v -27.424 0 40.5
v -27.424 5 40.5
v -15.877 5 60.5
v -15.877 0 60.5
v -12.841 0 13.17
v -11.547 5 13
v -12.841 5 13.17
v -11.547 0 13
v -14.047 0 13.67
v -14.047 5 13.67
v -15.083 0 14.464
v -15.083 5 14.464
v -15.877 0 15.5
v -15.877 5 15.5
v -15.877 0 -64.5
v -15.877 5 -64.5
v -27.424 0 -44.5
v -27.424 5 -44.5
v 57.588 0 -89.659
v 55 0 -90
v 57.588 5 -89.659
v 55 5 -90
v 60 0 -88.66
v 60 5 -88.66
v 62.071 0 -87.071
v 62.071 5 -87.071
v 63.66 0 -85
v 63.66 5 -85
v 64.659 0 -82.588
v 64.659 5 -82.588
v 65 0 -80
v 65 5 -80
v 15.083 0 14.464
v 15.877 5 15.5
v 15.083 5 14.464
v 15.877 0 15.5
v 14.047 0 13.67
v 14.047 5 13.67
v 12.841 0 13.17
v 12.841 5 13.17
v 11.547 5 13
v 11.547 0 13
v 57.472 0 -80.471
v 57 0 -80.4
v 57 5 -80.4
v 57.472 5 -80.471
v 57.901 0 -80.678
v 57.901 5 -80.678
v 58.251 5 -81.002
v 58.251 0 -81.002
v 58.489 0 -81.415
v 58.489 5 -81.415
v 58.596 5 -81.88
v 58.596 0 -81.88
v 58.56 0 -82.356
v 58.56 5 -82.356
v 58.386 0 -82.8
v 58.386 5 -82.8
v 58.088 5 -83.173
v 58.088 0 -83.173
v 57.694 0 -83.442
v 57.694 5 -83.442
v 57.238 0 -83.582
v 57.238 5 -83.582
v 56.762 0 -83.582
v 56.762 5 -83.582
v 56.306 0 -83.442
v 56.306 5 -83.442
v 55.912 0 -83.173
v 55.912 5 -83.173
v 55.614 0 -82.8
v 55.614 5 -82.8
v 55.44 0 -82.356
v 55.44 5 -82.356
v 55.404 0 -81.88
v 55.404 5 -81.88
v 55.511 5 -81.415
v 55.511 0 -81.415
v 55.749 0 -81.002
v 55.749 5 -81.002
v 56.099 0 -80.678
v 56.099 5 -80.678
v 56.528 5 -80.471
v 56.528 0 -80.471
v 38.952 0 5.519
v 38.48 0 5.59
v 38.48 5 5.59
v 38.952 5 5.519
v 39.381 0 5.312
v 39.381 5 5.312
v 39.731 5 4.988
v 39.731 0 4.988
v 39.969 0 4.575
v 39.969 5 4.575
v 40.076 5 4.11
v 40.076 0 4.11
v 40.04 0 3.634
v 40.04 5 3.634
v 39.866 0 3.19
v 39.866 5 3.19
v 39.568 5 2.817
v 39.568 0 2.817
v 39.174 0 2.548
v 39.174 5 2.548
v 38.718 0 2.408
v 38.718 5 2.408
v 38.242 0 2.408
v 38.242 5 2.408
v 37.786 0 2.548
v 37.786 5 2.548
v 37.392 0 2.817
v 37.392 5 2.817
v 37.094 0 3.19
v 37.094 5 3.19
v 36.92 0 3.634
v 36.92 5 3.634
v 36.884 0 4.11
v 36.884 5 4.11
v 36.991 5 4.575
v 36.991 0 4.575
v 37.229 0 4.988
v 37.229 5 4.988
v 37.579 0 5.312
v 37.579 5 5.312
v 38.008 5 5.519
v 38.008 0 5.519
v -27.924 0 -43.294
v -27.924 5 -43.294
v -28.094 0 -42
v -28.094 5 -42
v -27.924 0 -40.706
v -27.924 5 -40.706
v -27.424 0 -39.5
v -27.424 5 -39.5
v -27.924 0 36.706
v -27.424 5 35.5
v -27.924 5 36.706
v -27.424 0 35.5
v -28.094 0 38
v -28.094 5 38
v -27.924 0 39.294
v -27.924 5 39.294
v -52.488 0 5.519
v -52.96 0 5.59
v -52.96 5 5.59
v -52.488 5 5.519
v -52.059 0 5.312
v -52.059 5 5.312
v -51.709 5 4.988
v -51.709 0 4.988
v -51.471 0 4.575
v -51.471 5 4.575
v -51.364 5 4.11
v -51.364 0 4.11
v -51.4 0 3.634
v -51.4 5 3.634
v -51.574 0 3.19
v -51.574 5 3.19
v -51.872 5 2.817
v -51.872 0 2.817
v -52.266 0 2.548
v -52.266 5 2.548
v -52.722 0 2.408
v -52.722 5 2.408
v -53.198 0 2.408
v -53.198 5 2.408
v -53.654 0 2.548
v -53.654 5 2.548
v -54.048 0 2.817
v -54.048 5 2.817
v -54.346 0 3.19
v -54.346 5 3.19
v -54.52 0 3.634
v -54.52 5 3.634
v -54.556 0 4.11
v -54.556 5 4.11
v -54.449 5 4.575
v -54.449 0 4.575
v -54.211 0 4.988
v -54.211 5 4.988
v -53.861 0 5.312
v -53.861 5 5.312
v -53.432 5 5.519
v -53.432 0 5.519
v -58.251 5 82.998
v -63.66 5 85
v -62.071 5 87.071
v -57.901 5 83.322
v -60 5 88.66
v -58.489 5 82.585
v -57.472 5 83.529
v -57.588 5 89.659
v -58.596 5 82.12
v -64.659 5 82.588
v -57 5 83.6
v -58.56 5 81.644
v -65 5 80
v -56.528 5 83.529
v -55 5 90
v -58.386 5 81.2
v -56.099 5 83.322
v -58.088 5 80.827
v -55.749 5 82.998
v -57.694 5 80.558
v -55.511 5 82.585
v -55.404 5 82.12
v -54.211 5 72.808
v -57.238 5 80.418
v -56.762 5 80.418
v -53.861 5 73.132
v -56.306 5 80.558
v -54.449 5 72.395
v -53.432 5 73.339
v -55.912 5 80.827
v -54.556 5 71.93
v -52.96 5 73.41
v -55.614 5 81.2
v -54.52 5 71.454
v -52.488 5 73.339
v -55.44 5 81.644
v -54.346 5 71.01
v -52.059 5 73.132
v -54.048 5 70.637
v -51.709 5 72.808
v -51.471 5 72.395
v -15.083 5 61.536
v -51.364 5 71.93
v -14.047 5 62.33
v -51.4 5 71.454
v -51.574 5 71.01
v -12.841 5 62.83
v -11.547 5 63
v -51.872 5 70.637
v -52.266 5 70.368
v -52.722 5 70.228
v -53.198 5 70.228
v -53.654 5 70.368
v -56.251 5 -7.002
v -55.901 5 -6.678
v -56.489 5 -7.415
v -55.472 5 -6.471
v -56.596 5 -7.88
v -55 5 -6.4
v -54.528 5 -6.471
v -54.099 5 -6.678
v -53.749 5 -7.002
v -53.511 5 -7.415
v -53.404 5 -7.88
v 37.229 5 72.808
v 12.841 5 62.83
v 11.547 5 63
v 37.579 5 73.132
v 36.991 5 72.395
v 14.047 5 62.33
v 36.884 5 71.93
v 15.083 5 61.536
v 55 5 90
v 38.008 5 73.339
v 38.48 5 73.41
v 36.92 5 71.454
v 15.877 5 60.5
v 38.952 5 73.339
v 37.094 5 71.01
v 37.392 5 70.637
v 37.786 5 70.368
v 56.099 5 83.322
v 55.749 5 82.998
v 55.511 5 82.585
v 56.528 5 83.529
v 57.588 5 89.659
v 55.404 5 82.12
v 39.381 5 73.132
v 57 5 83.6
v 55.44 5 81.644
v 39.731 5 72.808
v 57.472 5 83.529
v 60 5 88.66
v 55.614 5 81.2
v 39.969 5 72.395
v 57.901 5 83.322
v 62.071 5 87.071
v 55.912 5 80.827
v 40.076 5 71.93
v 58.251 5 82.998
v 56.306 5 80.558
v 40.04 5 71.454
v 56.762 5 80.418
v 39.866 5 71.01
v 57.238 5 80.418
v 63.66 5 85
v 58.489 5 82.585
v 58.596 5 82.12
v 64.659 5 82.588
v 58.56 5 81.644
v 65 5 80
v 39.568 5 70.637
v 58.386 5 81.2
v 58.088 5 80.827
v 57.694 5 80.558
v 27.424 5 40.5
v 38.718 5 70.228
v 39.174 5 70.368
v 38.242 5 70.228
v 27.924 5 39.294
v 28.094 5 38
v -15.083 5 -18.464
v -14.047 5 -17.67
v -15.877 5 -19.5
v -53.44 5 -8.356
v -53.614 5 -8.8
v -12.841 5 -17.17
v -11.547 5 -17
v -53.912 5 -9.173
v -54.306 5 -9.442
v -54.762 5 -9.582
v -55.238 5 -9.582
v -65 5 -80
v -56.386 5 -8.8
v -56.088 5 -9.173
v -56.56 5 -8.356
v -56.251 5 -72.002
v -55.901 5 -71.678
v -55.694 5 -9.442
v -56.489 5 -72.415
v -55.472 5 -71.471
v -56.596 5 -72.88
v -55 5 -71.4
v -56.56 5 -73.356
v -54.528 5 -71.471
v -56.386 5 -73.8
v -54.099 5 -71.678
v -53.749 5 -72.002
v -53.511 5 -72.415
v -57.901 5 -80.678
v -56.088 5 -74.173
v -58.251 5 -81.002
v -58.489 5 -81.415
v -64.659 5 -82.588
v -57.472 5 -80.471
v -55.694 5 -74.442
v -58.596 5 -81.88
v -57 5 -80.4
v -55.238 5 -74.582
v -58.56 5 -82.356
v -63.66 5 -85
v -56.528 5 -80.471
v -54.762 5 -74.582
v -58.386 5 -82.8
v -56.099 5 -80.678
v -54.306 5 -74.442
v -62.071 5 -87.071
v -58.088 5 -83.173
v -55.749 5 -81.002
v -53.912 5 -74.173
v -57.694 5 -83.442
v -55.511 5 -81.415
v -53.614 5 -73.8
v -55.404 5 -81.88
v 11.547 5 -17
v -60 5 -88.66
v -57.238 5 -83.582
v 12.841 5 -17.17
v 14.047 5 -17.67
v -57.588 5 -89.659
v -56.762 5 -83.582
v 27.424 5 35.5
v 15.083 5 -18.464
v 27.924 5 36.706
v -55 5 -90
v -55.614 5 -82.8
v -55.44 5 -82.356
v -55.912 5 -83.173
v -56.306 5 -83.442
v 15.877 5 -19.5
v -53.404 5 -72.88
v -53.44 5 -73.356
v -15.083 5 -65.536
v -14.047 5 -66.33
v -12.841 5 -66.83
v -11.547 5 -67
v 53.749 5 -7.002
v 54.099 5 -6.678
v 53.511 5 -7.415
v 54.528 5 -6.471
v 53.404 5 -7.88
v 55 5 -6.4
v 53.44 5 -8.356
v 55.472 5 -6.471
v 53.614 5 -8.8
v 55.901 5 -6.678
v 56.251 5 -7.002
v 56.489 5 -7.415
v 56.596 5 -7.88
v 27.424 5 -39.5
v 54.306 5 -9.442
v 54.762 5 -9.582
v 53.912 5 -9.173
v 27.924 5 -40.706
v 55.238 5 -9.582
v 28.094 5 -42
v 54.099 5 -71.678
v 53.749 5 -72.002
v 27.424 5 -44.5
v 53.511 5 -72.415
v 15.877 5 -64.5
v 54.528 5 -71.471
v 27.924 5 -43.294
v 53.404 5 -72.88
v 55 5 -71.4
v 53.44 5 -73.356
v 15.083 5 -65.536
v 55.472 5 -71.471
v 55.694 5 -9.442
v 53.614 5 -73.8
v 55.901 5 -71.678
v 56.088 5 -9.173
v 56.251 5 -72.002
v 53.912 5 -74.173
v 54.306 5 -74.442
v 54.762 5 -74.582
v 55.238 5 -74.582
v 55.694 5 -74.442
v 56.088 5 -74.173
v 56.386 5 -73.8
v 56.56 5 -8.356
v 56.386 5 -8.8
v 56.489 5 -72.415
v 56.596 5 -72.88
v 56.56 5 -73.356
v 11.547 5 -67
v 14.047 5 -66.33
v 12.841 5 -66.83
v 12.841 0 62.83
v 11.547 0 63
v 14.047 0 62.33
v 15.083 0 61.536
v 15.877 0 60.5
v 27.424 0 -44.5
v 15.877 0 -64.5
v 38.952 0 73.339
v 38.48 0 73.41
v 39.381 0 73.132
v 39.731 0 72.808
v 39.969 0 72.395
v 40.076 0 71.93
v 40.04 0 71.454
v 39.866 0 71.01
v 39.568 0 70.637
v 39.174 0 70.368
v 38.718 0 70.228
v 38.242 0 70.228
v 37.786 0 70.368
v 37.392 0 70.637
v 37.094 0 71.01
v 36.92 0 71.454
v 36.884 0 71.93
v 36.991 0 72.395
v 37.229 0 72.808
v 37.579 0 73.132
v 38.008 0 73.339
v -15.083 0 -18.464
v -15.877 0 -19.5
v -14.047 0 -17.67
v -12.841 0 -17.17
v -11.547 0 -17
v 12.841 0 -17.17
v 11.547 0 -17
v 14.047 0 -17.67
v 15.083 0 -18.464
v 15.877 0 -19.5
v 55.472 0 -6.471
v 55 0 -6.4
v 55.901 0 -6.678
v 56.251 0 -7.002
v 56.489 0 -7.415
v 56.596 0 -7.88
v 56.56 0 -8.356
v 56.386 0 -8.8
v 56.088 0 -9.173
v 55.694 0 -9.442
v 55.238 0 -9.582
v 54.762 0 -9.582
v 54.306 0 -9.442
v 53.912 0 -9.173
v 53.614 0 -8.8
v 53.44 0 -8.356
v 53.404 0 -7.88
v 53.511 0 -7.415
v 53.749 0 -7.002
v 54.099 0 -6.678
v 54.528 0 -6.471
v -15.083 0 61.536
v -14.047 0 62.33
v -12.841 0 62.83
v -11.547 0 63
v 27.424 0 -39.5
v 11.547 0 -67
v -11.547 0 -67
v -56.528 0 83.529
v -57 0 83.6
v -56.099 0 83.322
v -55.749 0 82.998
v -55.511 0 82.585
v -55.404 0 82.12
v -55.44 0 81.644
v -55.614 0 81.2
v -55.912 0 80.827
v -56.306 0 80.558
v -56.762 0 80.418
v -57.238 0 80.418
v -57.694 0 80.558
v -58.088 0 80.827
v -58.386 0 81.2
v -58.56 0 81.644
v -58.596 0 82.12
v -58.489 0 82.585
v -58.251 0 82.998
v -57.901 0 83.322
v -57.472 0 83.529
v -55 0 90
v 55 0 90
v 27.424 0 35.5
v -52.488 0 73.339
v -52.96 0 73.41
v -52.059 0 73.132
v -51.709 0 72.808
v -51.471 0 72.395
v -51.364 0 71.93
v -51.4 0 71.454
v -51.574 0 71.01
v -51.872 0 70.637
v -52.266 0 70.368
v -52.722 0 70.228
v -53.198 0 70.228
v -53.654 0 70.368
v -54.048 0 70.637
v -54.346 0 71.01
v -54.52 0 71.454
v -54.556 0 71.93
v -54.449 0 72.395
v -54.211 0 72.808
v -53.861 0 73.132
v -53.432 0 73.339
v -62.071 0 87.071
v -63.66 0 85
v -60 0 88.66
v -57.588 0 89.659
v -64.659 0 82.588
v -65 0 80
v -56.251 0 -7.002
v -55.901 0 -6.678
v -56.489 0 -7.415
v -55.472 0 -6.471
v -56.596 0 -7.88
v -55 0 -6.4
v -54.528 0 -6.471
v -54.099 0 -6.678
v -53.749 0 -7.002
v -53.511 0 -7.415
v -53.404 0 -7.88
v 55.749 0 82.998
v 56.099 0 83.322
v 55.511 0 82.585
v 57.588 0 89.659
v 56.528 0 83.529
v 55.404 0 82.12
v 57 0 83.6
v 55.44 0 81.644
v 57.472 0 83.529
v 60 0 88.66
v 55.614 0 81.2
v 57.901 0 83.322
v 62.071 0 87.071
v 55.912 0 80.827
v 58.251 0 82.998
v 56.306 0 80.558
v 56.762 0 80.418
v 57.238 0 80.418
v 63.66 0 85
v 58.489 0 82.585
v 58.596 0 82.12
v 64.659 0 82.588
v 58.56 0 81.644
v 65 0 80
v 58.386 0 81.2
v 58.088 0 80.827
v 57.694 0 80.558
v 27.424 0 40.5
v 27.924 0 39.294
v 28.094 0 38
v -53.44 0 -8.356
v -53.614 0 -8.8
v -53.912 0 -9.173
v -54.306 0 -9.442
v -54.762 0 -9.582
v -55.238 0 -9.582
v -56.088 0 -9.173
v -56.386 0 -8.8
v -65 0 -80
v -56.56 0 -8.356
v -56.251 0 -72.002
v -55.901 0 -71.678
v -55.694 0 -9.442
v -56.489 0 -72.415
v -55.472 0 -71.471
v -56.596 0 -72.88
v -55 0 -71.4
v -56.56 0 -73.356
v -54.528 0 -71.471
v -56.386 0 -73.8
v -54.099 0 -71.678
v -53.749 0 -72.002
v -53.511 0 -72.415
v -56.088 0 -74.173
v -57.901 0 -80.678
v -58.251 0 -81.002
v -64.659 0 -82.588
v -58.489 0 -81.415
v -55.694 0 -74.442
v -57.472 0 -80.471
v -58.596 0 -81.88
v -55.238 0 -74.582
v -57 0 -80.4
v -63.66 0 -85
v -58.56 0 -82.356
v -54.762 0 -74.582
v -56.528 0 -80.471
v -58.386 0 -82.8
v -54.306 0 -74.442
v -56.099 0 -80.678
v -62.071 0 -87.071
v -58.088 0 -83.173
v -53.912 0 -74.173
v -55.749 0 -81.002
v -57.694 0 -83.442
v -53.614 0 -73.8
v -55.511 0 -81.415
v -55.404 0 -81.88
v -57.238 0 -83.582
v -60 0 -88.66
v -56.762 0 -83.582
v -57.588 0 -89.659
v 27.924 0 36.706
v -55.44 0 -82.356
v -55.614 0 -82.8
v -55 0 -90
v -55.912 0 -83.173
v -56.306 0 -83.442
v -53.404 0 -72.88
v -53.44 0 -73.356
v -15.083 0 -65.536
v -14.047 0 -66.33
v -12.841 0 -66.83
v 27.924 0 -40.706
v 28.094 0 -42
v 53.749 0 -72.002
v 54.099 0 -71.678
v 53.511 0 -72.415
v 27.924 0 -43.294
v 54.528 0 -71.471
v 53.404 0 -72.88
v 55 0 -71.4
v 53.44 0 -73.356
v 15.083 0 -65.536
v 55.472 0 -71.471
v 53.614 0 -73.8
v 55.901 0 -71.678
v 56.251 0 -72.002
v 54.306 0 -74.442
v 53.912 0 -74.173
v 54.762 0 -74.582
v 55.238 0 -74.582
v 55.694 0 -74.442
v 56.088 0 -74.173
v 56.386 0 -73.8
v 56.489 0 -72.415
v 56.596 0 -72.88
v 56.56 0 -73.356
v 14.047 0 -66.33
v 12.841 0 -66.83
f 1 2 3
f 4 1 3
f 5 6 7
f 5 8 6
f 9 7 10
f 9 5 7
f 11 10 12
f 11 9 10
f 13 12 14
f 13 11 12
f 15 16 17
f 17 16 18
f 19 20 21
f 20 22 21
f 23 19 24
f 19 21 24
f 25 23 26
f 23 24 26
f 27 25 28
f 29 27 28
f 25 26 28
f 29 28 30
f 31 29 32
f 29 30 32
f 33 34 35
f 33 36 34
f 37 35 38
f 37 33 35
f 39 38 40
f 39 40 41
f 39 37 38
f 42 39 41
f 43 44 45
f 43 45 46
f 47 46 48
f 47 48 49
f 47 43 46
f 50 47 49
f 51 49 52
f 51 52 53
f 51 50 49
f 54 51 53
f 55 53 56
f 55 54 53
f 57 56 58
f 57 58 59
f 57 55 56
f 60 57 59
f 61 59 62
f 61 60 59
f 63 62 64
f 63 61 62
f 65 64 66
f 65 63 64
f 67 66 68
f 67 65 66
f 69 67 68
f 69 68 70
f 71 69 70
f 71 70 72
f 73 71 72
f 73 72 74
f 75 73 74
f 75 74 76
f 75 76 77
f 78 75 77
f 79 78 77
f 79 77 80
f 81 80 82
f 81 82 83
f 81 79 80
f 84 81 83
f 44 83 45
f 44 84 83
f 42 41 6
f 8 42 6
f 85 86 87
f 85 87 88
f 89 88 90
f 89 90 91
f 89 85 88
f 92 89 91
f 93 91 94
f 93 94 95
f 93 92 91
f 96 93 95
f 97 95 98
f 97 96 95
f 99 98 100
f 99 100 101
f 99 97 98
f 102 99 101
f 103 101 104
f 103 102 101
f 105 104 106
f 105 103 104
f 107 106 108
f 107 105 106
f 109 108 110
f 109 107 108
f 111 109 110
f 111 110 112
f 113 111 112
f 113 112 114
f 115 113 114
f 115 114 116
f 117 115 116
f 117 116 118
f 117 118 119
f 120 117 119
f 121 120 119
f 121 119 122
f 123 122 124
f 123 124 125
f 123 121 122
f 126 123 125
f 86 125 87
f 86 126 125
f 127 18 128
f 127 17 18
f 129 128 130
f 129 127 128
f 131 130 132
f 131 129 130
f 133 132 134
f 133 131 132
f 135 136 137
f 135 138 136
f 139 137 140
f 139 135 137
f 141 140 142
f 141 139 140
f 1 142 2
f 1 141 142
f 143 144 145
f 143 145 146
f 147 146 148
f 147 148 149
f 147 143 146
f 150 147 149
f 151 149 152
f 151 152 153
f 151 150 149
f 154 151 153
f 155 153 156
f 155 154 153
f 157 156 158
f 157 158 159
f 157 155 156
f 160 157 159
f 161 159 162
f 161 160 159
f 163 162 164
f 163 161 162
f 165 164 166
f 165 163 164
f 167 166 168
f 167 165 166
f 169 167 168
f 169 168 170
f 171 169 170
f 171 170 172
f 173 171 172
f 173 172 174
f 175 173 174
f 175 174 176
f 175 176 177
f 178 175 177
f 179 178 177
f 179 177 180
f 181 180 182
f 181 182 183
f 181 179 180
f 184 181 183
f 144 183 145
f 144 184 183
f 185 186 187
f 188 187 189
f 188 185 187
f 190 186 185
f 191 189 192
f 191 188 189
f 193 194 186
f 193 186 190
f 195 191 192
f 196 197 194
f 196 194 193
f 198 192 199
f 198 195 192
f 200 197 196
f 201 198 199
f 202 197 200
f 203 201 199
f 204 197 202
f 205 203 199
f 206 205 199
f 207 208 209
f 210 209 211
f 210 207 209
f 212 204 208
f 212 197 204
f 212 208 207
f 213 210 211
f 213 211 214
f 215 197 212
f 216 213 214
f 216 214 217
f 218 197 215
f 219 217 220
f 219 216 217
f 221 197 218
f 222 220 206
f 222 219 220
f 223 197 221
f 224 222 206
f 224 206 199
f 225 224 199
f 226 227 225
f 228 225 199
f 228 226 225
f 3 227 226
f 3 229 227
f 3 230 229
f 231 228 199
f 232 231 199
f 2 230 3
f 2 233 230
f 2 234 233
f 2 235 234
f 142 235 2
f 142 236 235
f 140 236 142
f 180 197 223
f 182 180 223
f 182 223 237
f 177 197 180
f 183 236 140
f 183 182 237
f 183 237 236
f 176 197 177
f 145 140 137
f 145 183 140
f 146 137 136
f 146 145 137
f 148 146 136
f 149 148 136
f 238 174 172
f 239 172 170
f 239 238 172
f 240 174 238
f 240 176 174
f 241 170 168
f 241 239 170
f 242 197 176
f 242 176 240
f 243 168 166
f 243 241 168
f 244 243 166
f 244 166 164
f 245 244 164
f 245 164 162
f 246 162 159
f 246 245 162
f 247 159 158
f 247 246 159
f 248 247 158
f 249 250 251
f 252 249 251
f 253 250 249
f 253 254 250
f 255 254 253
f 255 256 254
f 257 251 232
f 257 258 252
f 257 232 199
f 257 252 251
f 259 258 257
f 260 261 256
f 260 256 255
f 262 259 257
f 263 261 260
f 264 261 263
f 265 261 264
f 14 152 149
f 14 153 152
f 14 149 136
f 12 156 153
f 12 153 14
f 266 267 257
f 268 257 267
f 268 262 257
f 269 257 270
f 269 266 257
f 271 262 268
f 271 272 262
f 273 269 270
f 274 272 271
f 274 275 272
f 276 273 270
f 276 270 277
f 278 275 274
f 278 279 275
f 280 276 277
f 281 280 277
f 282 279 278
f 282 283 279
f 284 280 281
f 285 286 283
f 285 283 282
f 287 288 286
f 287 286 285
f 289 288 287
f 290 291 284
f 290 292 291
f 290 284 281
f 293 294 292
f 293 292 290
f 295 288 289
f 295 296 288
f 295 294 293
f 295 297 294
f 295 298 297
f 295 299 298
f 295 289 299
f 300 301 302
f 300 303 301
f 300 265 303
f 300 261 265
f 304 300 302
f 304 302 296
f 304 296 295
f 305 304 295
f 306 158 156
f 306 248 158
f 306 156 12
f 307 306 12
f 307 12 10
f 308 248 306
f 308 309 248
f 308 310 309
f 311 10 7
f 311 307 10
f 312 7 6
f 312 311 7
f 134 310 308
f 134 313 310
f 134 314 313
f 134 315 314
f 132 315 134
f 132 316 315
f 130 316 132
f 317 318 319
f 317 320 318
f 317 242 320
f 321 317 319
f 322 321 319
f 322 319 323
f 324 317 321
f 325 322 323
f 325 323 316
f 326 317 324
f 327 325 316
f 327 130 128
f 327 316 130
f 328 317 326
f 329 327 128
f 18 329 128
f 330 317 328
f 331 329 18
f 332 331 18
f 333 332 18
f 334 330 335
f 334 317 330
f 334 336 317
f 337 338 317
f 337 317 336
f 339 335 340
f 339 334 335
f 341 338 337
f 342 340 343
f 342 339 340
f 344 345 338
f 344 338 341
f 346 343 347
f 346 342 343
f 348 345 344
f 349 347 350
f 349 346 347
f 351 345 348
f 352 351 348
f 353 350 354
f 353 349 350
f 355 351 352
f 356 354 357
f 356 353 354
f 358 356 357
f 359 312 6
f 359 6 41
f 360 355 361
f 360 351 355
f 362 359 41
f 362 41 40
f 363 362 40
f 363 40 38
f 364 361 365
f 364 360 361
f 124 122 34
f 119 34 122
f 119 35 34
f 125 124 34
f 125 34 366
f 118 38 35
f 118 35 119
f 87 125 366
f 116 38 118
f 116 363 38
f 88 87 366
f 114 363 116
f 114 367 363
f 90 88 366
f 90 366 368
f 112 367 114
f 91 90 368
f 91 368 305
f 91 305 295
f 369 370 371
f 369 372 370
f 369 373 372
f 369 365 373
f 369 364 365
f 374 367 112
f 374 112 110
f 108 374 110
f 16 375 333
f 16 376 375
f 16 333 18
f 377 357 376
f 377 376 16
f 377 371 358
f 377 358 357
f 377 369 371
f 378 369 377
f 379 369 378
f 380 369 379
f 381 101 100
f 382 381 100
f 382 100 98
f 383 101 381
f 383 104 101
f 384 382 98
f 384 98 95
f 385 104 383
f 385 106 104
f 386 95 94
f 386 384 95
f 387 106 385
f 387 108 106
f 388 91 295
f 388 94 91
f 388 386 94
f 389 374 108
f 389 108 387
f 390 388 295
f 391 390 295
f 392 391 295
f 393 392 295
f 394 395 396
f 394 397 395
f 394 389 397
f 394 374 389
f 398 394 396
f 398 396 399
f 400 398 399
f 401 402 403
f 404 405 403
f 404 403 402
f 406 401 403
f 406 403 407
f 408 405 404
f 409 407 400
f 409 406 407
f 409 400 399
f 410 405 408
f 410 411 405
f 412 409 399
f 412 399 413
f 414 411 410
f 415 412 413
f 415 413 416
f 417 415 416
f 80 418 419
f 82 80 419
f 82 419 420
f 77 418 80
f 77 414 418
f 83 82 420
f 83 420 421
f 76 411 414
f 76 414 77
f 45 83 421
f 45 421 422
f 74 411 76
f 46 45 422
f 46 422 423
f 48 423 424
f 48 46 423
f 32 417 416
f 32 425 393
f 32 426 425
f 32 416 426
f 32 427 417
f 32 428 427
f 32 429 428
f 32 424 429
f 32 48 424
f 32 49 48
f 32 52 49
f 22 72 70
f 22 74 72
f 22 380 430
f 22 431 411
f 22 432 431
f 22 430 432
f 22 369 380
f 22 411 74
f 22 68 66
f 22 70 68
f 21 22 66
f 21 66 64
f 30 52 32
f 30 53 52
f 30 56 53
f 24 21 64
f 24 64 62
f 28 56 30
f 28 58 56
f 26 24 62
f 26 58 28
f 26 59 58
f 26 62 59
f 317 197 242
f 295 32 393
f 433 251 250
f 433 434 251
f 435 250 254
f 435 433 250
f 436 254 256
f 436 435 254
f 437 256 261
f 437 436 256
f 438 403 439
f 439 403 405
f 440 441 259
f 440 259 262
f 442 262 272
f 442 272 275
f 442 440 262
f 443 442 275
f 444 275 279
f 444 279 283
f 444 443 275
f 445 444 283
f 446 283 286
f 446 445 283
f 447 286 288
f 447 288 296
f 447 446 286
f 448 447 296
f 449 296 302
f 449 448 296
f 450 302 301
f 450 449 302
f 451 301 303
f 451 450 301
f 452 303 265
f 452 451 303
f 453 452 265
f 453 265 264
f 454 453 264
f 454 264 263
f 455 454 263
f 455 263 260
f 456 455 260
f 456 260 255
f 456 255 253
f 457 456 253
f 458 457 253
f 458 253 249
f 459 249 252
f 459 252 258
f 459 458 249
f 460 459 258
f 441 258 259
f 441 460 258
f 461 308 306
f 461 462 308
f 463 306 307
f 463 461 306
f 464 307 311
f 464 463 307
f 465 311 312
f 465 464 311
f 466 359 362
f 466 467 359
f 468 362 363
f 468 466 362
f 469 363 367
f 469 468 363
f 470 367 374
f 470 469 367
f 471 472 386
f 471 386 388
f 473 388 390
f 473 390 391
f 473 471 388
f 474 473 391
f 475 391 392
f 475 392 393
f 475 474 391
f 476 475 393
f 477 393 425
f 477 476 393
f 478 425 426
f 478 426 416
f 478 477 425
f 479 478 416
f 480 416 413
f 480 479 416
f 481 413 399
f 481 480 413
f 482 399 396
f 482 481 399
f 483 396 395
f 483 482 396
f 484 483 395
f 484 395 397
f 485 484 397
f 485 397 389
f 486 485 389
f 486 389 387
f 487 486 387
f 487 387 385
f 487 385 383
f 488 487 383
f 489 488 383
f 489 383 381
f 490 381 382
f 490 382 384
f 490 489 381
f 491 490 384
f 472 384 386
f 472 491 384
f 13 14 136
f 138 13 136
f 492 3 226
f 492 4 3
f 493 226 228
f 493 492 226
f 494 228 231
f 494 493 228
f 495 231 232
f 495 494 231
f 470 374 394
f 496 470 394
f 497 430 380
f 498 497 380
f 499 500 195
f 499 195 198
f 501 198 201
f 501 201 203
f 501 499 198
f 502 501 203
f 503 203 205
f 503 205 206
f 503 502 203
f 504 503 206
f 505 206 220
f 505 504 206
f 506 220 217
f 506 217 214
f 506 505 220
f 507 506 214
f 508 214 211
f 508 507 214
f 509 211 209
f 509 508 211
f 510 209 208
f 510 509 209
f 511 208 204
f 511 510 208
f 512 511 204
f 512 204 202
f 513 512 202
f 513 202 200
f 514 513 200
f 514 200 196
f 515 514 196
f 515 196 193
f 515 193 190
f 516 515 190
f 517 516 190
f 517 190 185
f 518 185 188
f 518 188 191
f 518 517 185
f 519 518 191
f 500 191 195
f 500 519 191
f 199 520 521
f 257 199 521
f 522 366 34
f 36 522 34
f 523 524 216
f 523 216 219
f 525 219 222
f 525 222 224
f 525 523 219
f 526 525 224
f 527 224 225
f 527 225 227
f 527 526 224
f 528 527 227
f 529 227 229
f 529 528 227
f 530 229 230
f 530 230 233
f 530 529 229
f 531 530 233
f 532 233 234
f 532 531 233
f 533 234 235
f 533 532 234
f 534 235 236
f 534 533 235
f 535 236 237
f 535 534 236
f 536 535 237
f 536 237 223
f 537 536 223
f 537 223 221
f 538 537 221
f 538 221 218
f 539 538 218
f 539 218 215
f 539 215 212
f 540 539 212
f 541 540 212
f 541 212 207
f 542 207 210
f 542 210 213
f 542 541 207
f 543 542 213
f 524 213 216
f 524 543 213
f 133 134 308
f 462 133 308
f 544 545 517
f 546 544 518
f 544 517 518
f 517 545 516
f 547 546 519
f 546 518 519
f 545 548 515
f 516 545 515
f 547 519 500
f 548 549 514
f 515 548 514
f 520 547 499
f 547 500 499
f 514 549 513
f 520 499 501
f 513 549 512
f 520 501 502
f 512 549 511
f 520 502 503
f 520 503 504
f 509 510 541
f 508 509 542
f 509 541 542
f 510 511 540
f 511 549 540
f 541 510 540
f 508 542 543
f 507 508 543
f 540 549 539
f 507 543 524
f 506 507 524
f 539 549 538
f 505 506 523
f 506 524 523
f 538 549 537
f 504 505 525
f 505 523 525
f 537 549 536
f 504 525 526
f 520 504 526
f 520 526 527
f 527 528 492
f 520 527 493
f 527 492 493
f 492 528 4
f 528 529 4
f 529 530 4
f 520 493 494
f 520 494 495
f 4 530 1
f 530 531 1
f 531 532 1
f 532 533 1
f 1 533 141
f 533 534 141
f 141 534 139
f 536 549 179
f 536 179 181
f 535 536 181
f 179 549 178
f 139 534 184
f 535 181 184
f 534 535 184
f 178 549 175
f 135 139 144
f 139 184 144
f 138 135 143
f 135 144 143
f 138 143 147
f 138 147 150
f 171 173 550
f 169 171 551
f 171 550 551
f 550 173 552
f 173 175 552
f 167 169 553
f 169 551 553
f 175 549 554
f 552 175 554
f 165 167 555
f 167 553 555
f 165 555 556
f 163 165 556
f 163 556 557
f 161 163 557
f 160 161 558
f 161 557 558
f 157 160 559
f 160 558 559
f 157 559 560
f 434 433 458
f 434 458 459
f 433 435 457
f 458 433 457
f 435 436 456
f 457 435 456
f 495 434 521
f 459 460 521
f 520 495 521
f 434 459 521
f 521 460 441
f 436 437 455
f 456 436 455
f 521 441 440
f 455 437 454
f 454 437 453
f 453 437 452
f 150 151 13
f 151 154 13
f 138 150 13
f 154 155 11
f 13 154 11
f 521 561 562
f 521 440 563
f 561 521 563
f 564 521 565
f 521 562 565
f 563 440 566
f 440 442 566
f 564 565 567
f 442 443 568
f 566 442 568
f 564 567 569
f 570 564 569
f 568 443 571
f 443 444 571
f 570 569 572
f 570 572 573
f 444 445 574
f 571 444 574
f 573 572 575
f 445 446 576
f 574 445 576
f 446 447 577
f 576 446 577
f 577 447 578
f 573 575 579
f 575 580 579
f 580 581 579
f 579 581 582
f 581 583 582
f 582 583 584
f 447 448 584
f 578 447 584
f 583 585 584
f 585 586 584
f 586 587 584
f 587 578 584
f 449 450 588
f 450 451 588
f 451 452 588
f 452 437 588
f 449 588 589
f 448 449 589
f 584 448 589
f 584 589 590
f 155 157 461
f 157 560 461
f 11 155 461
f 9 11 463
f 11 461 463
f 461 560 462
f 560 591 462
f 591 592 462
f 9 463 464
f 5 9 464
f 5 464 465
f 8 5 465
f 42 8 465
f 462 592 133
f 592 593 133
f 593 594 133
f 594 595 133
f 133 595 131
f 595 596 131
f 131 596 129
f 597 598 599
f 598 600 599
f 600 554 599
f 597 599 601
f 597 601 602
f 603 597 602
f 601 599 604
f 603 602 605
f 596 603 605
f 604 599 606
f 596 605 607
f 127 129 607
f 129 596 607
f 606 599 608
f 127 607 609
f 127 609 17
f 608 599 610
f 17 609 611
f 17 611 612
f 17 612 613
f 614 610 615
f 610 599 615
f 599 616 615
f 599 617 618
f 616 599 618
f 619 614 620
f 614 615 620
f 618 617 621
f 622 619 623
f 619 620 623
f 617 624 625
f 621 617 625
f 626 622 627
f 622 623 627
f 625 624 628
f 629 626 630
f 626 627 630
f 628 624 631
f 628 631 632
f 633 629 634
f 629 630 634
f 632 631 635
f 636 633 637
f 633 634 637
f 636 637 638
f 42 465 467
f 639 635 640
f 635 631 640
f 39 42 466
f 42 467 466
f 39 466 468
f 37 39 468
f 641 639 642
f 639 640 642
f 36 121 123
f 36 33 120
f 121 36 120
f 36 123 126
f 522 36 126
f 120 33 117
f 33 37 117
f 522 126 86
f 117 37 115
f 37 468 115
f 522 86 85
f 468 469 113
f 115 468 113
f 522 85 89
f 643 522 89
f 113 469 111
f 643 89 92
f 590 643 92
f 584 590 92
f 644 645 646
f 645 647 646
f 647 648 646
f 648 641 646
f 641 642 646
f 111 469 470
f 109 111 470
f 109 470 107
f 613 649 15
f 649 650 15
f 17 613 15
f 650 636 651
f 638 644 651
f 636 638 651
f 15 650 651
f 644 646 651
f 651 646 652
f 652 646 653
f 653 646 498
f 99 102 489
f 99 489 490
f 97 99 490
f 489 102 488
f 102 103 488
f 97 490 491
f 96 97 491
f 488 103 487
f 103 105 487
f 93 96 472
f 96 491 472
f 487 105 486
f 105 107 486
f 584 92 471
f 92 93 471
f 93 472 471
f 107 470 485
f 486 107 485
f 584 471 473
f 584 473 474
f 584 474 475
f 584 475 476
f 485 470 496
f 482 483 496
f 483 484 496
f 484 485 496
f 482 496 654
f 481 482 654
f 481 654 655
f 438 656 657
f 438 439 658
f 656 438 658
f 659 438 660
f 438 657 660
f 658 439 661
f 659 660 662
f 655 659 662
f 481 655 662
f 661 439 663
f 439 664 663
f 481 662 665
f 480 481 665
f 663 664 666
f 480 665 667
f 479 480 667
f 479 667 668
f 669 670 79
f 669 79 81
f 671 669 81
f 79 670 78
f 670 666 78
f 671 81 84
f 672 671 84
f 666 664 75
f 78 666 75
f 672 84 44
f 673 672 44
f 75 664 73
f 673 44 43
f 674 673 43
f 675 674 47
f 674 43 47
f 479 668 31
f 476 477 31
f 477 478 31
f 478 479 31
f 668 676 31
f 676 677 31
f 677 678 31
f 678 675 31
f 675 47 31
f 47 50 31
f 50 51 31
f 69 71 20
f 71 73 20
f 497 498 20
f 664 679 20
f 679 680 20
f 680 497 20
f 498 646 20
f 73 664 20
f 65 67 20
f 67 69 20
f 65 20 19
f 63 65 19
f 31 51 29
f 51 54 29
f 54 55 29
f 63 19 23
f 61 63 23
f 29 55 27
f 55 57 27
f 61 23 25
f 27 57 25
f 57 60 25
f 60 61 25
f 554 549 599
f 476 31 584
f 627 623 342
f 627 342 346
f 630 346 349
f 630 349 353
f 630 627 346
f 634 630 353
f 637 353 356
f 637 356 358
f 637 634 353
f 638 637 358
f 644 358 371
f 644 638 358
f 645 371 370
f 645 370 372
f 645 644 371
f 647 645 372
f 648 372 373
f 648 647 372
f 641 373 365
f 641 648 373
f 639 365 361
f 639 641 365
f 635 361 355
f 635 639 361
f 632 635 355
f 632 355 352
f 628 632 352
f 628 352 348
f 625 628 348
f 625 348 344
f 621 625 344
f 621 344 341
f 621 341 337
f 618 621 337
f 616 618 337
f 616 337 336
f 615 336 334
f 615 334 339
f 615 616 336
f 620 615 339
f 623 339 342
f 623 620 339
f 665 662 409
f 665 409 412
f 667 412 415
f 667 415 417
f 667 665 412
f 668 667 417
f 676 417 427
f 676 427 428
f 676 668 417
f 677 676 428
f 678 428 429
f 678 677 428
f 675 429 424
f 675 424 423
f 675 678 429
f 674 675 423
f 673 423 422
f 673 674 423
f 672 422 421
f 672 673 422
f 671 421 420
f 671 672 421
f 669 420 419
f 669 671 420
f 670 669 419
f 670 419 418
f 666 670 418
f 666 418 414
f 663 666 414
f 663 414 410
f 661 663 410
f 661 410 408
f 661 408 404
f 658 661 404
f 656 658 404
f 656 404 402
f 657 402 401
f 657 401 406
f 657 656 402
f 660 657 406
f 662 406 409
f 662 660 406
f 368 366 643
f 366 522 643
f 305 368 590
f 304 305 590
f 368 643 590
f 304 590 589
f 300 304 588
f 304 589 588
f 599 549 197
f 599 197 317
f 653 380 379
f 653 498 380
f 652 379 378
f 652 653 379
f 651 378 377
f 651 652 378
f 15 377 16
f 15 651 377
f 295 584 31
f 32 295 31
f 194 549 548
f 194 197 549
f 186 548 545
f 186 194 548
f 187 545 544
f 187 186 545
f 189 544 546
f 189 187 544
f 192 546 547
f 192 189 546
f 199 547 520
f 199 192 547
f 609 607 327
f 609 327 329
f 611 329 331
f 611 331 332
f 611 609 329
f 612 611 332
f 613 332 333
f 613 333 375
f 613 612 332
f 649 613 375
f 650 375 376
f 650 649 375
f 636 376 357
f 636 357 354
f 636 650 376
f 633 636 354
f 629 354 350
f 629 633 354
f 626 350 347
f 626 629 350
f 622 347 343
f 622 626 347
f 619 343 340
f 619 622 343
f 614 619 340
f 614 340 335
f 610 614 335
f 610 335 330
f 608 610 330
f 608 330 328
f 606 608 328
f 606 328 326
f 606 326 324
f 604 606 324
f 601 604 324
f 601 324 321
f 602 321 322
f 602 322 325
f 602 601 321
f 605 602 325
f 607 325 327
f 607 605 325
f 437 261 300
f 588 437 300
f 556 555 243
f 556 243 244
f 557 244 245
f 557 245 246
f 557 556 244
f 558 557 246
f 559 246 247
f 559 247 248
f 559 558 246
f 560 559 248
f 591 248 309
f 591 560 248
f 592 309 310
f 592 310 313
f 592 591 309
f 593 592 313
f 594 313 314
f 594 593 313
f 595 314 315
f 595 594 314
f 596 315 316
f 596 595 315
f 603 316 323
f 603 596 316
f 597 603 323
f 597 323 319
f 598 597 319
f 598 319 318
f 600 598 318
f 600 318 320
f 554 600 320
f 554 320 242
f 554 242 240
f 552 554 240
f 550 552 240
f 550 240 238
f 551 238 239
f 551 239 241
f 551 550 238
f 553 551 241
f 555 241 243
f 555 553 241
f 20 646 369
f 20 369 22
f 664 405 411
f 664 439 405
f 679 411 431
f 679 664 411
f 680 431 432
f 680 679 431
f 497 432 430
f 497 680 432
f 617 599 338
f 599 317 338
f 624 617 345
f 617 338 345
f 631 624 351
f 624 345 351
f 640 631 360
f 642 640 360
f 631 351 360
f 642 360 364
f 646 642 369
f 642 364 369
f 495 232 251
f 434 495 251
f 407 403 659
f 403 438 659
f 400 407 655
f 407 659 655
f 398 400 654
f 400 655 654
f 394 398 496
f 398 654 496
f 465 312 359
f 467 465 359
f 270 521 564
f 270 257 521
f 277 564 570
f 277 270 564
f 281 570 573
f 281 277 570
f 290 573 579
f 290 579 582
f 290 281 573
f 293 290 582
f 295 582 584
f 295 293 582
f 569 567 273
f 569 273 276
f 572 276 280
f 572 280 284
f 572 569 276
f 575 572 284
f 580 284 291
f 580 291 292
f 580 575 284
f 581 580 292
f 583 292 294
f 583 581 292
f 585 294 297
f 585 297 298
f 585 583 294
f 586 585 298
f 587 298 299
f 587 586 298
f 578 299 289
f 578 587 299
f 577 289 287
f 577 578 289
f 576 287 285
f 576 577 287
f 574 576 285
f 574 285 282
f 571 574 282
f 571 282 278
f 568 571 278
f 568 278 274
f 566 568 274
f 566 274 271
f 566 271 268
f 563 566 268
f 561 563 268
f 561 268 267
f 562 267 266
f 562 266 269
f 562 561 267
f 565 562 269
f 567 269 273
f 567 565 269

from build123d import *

# Parameters (mm, degrees)
SKETCH1_W           = 130
SKETCH1_H           = 180
SKETCH1_R           = 1.6
SKETCH1_W_2         = 116.84
SKETCH1_H_2         = 76.2
SKETCH1_W_3         = 120
SKETCH1_H_3         = 75
BOSS_EXTRUDE1_DEPTH = 5
FILLET1_R           = 10
CUT_EXTRUDE1_DEPTH  = 10
FILLET2_R           = 5


with BuildPart() as part:
    # Sketch1 → Boss-Extrude1 (new body)
    # profile 1 of 3: a face of its own
    with BuildSketch(Plane(origin=(0, 0, 0), x_dir=(1, 0, 0), z_dir=(0, 1, 0))):
        Rectangle(SKETCH1_W, SKETCH1_H)
        with Locations(Location((57, -82, 0), (0, 0, 270))):
            Circle(SKETCH1_R, mode=Mode.SUBTRACT)
        with Locations(Location((-57, -82, 0), (0, 0, 270))):
            Circle(SKETCH1_R, mode=Mode.SUBTRACT)
        with Locations(Location((57, 82, 0), (0, 0, 270))):
            Circle(SKETCH1_R, mode=Mode.SUBTRACT)
        with Locations(Location((-57, 82, 0), (0, 0, 270))):
            Circle(SKETCH1_R, mode=Mode.SUBTRACT)
        with Locations((0, -37.9)):
            Rectangle(SKETCH1_W_2, SKETCH1_H_2, mode=Mode.SUBTRACT)
        with Locations((0, 40.5)):
            Rectangle(SKETCH1_W_3, SKETCH1_H_3, mode=Mode.SUBTRACT)
    # profile 2 of 3: a face of its own
    with BuildSketch(Plane(origin=(0, 0, 0), x_dir=(1, 0, 0), z_dir=(0, 1, 0))):
        with Locations((0, 40.5)):
            Rectangle(SKETCH1_W_3, SKETCH1_H_3)
        with Locations(Location((55, 8, 0), (0, 0, 270))):
            Circle(SKETCH1_R, mode=Mode.SUBTRACT)
        with Locations(Location((55, 73, 0), (0, 0, 270))):
            Circle(SKETCH1_R, mode=Mode.SUBTRACT)
        with Locations(Location((-55, 8, 0), (0, 0, 270))):
            Circle(SKETCH1_R, mode=Mode.SUBTRACT)
        with Locations(Location((-55, 73, 0), (0, 0, 270))):
            Circle(SKETCH1_R, mode=Mode.SUBTRACT)
    # profile 3 of 3: a face of its own
    with BuildSketch(Plane(origin=(0, 0, 0), x_dir=(1, 0, 0), z_dir=(0, 1, 0))):
        with Locations((0, -37.9)):
            Rectangle(SKETCH1_W_2, SKETCH1_H_2)
        with Locations(Location((-52.96, -71.81, 0), (0, 0, 270))):
            Circle(SKETCH1_R, mode=Mode.SUBTRACT)
        with Locations(Location((-52.96, -3.99, 0), (0, 0, 270))):
            Circle(SKETCH1_R, mode=Mode.SUBTRACT)
        with Locations(Location((38.48, -71.81, 0), (0, 0, 270))):
            Circle(SKETCH1_R, mode=Mode.SUBTRACT)
        with Locations(Location((38.48, -3.99, 0), (0, 0, 270))):
            Circle(SKETCH1_R, mode=Mode.SUBTRACT)
    extrude(amount=BOSS_EXTRUDE1_DEPTH)

    # Fillet1
    fillet1_edges = [part.edges().sort_by_distance(p)[0] for p in [
        (65, 2.5, 90),
        (-65, 2.5, 90),
        (-65, 2.5, -90),
        (65, 2.5, -90),
    ]]
    fillet(fillet1_edges, radius=FILLET1_R)

    # Sketch2 → Cut-Extrude1 (cut)
    with BuildSketch(Plane(origin=(0, 5, 0), x_dir=(1, 0, 0), z_dir=(0, 1, 0))):
        Polygon((28.867513459, 42), (14.43375673, 67), (-14.43375673, 67), (-28.867513459, 42), (-14.43375673, 17), (14.43375673, 17), align=None)
        Polygon((28.867513459, -38), (14.43375673, -13), (-14.43375673, -13), (-28.867513459, -38), (-14.43375673, -63), (14.43375673, -63), align=None)
    extrude(amount=-CUT_EXTRUDE1_DEPTH, mode=Mode.SUBTRACT)

    # Fillet2
    fillet2_edges = [part.edges().sort_by_distance(p)[0] for p in [
        (28.867513459, 2.5, -42),
        (14.43375673, 2.5, -17),
        (-14.43375673, 2.5, -17),
        (-28.867513459, 2.5, -42),
        (-14.43375673, 2.5, -67),
        (14.43375673, 2.5, -67),
        (28.867513459, 2.5, 38),
        (14.43375673, 2.5, 63),
        (-14.43375673, 2.5, 63),
        (-28.867513459, 2.5, 38),
        (-14.43375673, 2.5, 13),
        (14.43375673, 2.5, 13),
    ]]
    fillet(fillet2_edges, radius=FILLET2_R)


solid = part.part
